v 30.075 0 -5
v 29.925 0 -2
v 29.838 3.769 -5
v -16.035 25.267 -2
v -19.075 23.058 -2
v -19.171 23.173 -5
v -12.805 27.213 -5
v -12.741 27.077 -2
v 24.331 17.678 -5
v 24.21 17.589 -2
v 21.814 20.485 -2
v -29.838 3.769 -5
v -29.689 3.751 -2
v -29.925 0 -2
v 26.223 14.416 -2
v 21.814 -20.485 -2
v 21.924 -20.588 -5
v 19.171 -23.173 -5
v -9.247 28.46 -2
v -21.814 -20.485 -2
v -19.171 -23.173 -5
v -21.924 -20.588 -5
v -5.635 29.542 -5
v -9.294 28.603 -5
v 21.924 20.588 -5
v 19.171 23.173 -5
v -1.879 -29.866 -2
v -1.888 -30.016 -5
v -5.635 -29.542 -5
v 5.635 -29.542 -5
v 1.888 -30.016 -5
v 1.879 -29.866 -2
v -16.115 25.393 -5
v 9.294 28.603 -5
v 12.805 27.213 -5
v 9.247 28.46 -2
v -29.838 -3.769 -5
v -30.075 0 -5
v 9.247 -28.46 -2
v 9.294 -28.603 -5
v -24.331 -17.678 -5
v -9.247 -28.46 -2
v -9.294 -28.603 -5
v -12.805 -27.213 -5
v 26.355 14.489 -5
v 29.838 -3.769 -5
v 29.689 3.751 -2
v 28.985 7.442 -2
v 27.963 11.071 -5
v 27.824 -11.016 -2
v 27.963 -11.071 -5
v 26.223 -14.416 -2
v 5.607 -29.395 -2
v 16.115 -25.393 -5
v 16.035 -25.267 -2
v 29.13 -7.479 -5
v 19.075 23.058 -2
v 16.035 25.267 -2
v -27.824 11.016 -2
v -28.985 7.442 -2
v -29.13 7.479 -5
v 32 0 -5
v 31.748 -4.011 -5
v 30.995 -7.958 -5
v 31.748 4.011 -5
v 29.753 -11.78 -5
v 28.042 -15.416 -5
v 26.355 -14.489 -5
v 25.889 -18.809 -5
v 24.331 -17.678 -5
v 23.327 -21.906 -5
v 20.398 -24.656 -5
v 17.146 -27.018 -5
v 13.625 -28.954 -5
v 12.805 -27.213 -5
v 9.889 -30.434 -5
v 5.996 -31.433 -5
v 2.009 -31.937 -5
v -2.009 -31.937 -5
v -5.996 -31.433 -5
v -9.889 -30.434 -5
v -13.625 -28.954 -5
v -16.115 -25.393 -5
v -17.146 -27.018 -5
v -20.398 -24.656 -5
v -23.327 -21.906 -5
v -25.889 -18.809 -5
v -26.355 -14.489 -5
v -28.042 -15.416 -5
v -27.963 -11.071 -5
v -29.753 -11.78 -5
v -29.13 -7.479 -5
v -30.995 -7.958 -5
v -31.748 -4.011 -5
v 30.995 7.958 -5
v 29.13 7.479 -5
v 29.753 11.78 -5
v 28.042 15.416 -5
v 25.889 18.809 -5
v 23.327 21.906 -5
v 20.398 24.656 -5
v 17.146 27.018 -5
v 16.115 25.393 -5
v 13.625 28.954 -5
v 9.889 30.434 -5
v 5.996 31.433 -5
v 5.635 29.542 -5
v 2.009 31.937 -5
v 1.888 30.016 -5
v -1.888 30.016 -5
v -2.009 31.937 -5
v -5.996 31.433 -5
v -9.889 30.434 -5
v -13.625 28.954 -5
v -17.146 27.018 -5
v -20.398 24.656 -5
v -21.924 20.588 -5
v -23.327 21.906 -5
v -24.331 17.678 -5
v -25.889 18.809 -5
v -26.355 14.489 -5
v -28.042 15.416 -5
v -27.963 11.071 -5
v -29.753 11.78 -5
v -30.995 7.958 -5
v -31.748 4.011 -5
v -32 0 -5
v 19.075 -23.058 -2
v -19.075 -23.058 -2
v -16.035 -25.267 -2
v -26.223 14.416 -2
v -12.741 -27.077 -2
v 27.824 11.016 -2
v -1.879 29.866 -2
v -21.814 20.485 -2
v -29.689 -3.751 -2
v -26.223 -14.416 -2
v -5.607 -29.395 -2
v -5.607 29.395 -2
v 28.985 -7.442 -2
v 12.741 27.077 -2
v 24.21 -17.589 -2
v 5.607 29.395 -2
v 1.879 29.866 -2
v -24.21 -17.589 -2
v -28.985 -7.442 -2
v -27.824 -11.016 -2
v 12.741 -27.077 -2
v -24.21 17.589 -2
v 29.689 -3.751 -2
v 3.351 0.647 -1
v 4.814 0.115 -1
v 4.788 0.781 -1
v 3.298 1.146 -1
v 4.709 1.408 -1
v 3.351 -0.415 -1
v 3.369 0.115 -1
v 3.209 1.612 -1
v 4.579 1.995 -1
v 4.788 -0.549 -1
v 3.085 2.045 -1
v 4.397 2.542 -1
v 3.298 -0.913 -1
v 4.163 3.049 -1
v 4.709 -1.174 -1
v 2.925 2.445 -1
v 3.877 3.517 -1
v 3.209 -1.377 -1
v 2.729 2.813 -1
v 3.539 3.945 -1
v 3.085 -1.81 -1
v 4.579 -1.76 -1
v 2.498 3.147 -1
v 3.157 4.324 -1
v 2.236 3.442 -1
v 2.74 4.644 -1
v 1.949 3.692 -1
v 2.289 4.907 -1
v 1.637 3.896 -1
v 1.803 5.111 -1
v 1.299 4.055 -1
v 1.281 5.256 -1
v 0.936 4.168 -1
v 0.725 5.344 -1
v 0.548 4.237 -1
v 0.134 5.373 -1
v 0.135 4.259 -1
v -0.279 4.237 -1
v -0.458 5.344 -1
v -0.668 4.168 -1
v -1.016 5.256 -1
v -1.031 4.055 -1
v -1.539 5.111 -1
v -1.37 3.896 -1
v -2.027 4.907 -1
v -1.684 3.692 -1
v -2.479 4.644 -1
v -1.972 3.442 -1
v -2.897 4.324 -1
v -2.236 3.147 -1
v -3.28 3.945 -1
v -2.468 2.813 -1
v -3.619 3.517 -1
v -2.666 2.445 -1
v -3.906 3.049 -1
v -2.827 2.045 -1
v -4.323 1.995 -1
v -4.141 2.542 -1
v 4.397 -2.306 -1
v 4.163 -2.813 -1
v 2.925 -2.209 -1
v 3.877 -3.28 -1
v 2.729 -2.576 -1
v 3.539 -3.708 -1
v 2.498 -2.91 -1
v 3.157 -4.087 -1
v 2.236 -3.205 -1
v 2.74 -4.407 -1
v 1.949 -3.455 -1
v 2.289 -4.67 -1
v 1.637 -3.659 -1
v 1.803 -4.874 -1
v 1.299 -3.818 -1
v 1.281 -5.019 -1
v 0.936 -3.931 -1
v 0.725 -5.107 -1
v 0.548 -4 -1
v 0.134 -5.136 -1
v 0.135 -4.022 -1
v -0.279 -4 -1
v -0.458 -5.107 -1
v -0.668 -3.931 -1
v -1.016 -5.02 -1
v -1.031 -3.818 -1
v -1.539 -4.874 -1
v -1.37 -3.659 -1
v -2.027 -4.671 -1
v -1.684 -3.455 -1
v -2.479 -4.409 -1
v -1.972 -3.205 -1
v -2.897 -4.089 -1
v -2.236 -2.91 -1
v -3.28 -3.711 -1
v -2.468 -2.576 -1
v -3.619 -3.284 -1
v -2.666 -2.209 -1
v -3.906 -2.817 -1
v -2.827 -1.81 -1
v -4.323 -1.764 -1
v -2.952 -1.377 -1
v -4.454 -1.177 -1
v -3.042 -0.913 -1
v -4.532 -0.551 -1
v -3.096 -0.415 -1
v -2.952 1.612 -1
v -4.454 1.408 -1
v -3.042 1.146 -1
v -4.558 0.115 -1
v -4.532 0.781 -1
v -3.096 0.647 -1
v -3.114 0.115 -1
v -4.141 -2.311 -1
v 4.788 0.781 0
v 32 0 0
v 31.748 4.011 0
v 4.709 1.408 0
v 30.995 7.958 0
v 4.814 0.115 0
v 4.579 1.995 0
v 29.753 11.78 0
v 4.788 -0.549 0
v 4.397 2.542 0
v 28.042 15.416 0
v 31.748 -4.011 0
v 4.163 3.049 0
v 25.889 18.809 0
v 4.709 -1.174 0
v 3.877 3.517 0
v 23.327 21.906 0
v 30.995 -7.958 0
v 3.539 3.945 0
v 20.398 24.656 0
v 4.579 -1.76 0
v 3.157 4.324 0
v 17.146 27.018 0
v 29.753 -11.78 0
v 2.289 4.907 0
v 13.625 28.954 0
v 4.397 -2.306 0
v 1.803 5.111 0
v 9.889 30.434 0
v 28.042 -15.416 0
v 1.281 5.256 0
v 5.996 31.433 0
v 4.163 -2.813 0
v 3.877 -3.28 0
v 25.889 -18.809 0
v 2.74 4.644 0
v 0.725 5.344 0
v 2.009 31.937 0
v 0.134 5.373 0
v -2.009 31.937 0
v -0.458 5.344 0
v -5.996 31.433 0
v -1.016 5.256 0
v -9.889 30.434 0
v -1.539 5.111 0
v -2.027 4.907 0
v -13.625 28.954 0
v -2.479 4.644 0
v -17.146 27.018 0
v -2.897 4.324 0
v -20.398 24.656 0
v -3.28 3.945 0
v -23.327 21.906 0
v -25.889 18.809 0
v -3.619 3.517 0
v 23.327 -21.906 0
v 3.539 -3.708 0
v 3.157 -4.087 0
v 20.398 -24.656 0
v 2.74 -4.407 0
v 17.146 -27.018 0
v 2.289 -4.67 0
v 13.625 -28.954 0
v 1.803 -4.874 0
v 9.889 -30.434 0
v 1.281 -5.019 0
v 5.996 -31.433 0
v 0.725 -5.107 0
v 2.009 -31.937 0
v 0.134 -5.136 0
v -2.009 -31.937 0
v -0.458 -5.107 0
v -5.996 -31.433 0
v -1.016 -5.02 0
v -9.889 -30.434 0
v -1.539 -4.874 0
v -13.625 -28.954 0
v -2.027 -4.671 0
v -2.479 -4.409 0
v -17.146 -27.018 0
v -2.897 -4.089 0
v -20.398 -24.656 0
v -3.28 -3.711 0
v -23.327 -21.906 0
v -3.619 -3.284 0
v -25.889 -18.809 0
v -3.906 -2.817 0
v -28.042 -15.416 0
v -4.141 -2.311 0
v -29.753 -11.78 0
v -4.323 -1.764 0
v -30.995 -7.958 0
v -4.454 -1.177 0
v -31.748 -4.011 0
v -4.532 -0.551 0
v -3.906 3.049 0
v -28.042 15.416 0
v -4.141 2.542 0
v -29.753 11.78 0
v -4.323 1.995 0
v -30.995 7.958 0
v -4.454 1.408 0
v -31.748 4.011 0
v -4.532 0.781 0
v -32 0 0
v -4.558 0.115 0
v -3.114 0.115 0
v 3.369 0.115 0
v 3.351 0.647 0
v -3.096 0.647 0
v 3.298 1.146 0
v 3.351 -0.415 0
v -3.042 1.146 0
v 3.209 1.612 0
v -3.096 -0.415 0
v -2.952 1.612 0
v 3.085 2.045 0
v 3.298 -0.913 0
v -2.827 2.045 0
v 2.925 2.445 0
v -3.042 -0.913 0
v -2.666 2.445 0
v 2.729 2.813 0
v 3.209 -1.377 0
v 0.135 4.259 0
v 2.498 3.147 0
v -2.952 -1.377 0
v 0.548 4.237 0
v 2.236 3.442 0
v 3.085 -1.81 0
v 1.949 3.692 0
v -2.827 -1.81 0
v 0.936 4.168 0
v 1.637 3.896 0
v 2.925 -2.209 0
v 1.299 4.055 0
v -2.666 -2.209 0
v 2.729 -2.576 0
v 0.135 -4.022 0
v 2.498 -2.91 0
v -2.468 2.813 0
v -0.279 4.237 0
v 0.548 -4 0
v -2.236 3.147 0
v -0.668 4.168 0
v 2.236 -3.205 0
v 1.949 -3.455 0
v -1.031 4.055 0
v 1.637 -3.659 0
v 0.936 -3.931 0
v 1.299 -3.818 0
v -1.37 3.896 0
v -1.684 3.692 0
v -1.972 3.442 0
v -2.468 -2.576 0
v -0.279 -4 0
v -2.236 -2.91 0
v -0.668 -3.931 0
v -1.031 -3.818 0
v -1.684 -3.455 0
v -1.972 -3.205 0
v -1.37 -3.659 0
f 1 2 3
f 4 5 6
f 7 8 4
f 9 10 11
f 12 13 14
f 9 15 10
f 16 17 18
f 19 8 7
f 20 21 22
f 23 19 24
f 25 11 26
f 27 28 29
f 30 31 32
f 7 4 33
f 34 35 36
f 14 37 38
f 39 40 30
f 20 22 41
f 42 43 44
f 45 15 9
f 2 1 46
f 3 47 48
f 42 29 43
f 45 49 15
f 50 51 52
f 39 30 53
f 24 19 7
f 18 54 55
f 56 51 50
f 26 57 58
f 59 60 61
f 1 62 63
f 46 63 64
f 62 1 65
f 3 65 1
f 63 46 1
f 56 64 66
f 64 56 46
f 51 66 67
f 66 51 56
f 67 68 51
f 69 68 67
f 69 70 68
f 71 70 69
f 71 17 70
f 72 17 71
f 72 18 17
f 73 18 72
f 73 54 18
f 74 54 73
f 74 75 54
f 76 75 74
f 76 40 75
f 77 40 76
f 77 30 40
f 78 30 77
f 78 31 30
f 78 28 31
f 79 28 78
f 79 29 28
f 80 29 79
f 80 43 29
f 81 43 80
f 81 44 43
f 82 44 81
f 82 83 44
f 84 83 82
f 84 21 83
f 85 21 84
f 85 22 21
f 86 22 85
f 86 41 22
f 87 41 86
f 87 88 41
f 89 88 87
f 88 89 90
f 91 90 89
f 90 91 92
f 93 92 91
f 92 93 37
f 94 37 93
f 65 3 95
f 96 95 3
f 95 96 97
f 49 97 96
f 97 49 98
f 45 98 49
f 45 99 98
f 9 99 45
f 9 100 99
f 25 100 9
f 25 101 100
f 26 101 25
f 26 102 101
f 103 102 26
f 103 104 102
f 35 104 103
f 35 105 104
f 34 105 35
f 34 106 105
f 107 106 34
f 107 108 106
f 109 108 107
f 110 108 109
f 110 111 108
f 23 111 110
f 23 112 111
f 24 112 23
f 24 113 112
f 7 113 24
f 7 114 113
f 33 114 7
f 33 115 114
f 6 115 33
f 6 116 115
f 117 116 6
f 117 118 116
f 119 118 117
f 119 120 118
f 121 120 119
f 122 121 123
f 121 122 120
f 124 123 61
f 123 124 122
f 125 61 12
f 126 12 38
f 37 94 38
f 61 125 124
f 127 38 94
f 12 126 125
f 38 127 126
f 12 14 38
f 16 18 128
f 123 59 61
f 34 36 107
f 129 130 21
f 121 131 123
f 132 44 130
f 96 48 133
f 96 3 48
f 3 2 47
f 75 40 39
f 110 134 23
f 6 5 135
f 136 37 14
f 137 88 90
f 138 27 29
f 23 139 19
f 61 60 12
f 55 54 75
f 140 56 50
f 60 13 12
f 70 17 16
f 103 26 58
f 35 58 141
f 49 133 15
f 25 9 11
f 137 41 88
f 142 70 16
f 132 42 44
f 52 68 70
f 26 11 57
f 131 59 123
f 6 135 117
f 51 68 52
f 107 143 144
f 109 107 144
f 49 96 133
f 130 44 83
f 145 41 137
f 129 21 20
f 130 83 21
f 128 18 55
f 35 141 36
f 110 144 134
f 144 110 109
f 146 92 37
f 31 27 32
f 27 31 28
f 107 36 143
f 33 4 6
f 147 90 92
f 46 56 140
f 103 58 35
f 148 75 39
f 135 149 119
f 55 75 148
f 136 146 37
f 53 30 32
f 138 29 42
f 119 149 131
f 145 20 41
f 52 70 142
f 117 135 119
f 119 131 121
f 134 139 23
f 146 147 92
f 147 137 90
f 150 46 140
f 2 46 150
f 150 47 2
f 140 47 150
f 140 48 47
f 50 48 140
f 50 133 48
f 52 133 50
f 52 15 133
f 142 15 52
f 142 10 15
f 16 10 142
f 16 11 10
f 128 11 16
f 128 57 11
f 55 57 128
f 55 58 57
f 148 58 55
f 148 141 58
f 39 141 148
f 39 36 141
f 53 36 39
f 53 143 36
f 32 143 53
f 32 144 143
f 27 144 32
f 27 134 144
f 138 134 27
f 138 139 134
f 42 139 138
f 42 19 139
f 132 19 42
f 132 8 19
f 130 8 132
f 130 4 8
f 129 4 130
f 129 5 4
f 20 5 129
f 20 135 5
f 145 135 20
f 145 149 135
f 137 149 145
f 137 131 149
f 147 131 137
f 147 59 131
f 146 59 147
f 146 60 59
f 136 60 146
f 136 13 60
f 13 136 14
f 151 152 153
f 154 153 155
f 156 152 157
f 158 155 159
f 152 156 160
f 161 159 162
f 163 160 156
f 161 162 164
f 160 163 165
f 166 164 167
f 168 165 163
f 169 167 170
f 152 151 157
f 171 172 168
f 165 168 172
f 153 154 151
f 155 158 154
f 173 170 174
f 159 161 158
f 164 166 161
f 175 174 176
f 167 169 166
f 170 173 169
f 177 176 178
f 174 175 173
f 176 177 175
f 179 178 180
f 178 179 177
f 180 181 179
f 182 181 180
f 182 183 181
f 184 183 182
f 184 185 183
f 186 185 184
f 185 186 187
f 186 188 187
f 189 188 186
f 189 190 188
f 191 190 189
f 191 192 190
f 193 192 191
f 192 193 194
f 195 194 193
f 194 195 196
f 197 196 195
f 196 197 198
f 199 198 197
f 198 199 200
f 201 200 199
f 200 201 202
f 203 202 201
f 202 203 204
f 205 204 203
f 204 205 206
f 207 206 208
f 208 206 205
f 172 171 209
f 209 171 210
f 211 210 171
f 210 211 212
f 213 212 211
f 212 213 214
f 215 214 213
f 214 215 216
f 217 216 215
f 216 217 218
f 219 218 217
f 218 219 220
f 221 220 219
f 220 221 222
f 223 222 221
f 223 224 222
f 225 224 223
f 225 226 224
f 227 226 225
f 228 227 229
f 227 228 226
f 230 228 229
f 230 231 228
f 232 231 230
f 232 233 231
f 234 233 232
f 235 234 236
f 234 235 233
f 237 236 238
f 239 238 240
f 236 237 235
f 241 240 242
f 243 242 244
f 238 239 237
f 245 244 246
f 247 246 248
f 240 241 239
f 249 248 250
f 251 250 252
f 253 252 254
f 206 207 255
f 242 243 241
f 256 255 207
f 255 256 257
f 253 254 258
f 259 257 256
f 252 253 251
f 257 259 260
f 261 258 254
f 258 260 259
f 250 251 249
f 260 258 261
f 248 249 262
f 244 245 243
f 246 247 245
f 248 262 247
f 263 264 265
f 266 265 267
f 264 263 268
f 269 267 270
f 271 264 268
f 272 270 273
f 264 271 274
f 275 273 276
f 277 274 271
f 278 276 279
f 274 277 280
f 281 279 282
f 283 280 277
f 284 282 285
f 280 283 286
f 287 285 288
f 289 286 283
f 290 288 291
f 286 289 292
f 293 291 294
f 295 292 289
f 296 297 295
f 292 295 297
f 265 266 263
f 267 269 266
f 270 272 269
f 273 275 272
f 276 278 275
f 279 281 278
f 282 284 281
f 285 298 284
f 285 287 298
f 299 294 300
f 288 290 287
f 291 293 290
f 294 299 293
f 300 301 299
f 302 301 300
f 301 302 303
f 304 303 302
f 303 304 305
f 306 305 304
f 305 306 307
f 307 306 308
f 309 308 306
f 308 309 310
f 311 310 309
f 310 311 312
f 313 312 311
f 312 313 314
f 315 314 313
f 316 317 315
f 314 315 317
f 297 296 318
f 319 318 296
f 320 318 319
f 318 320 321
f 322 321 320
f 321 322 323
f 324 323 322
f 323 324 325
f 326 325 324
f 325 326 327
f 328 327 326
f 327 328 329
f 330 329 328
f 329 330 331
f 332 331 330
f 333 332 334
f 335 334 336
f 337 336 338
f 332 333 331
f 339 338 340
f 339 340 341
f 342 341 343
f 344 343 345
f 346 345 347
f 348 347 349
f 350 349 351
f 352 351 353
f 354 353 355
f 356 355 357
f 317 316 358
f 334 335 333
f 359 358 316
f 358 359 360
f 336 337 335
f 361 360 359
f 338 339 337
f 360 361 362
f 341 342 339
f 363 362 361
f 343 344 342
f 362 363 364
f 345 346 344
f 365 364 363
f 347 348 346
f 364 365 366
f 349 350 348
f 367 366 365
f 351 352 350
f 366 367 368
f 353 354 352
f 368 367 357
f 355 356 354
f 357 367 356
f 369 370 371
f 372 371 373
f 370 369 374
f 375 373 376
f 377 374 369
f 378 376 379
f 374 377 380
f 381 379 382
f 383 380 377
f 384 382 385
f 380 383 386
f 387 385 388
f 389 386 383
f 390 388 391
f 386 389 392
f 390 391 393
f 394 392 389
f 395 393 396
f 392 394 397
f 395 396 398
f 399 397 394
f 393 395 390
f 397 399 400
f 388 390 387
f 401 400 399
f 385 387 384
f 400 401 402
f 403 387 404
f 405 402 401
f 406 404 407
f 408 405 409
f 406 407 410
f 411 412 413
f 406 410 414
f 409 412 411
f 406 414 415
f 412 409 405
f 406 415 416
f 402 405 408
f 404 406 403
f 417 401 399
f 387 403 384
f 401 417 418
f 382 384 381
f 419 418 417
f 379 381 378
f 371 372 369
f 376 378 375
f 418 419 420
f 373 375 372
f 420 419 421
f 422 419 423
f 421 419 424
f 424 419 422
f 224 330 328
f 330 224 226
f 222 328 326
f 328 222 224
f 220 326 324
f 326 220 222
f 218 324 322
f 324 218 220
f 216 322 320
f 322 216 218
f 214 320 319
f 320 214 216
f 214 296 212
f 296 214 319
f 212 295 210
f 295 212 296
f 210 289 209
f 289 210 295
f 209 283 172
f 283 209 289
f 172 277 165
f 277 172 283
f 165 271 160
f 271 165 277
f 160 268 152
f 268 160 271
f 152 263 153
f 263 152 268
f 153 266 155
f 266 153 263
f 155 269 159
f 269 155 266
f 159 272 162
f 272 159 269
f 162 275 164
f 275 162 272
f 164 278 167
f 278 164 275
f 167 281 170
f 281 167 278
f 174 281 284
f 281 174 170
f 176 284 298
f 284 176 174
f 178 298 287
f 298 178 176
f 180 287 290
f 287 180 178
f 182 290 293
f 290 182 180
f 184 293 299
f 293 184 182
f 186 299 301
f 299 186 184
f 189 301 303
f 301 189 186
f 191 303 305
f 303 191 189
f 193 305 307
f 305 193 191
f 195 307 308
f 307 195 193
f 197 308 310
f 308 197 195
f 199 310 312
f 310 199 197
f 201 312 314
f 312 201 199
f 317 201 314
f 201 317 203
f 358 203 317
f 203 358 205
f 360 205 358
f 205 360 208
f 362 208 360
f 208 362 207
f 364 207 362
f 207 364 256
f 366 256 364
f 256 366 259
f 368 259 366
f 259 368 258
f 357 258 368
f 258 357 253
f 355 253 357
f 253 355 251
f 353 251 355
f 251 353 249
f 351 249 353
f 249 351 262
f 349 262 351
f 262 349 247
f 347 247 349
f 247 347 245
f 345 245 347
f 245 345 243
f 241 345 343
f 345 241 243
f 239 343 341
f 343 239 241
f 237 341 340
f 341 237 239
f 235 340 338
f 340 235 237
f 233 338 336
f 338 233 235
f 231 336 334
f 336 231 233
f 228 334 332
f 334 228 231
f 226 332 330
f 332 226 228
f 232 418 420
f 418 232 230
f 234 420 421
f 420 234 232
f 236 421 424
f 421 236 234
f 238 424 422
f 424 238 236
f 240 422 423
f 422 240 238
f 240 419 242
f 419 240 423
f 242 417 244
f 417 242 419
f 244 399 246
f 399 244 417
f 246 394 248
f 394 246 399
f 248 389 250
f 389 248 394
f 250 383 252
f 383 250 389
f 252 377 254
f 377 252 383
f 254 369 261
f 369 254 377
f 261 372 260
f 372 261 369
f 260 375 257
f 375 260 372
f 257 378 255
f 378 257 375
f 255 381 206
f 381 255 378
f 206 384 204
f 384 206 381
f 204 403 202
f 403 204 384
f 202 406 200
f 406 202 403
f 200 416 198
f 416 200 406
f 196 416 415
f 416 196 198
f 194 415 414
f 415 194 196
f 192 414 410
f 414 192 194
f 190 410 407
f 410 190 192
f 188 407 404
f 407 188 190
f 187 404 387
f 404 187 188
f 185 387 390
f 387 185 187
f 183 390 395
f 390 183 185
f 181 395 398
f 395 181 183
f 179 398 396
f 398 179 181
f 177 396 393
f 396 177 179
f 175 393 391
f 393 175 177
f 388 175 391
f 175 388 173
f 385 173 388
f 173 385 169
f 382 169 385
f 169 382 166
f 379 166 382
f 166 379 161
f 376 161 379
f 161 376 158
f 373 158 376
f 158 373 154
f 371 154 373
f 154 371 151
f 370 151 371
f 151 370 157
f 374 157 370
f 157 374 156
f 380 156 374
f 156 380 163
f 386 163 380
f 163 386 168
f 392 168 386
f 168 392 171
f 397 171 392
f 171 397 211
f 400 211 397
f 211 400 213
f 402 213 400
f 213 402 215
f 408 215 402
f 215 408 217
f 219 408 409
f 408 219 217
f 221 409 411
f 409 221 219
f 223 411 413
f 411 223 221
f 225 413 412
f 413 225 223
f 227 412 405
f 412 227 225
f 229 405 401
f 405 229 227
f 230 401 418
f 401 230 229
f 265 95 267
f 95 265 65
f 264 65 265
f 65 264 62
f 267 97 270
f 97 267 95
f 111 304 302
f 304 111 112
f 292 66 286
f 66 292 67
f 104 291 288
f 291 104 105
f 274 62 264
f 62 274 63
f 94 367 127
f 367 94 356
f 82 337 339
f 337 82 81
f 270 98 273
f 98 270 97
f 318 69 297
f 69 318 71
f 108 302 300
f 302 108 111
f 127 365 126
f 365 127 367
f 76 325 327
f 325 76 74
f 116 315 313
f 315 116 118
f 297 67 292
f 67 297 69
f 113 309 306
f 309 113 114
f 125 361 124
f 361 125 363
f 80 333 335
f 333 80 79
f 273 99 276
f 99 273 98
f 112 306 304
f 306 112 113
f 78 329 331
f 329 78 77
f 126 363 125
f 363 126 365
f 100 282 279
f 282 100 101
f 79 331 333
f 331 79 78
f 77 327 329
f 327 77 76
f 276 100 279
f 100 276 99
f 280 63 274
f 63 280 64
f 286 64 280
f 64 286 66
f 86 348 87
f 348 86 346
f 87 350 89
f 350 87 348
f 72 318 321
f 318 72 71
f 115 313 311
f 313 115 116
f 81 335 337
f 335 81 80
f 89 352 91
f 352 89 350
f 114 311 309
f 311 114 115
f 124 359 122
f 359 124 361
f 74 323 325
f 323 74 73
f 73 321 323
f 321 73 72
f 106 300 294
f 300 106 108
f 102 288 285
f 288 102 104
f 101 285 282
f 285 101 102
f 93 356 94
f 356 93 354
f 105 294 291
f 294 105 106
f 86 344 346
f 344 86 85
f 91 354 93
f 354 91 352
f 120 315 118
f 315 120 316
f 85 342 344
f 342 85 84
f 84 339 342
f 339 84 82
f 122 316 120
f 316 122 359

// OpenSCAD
$fn = 50;


difference() {
	union() {
		translate(v = [0, 0, -5.0000000000]) {
			cylinder(h = 5, r = 32.0000000000);
		}
	}
	union() {
		#translate(v = [0, 0, -5.0000000000]) {
			cylinder(h = 3, r1 = 30.0750000000, r2 = 29.9250000000);
		}
		translate(v = [0, 0, -1]) {
			linear_extrude(height = 1) {
				text(font = "Impact", halign = "center", size = 10, text = "O", valign = "center");
			}
		}
	}
}
